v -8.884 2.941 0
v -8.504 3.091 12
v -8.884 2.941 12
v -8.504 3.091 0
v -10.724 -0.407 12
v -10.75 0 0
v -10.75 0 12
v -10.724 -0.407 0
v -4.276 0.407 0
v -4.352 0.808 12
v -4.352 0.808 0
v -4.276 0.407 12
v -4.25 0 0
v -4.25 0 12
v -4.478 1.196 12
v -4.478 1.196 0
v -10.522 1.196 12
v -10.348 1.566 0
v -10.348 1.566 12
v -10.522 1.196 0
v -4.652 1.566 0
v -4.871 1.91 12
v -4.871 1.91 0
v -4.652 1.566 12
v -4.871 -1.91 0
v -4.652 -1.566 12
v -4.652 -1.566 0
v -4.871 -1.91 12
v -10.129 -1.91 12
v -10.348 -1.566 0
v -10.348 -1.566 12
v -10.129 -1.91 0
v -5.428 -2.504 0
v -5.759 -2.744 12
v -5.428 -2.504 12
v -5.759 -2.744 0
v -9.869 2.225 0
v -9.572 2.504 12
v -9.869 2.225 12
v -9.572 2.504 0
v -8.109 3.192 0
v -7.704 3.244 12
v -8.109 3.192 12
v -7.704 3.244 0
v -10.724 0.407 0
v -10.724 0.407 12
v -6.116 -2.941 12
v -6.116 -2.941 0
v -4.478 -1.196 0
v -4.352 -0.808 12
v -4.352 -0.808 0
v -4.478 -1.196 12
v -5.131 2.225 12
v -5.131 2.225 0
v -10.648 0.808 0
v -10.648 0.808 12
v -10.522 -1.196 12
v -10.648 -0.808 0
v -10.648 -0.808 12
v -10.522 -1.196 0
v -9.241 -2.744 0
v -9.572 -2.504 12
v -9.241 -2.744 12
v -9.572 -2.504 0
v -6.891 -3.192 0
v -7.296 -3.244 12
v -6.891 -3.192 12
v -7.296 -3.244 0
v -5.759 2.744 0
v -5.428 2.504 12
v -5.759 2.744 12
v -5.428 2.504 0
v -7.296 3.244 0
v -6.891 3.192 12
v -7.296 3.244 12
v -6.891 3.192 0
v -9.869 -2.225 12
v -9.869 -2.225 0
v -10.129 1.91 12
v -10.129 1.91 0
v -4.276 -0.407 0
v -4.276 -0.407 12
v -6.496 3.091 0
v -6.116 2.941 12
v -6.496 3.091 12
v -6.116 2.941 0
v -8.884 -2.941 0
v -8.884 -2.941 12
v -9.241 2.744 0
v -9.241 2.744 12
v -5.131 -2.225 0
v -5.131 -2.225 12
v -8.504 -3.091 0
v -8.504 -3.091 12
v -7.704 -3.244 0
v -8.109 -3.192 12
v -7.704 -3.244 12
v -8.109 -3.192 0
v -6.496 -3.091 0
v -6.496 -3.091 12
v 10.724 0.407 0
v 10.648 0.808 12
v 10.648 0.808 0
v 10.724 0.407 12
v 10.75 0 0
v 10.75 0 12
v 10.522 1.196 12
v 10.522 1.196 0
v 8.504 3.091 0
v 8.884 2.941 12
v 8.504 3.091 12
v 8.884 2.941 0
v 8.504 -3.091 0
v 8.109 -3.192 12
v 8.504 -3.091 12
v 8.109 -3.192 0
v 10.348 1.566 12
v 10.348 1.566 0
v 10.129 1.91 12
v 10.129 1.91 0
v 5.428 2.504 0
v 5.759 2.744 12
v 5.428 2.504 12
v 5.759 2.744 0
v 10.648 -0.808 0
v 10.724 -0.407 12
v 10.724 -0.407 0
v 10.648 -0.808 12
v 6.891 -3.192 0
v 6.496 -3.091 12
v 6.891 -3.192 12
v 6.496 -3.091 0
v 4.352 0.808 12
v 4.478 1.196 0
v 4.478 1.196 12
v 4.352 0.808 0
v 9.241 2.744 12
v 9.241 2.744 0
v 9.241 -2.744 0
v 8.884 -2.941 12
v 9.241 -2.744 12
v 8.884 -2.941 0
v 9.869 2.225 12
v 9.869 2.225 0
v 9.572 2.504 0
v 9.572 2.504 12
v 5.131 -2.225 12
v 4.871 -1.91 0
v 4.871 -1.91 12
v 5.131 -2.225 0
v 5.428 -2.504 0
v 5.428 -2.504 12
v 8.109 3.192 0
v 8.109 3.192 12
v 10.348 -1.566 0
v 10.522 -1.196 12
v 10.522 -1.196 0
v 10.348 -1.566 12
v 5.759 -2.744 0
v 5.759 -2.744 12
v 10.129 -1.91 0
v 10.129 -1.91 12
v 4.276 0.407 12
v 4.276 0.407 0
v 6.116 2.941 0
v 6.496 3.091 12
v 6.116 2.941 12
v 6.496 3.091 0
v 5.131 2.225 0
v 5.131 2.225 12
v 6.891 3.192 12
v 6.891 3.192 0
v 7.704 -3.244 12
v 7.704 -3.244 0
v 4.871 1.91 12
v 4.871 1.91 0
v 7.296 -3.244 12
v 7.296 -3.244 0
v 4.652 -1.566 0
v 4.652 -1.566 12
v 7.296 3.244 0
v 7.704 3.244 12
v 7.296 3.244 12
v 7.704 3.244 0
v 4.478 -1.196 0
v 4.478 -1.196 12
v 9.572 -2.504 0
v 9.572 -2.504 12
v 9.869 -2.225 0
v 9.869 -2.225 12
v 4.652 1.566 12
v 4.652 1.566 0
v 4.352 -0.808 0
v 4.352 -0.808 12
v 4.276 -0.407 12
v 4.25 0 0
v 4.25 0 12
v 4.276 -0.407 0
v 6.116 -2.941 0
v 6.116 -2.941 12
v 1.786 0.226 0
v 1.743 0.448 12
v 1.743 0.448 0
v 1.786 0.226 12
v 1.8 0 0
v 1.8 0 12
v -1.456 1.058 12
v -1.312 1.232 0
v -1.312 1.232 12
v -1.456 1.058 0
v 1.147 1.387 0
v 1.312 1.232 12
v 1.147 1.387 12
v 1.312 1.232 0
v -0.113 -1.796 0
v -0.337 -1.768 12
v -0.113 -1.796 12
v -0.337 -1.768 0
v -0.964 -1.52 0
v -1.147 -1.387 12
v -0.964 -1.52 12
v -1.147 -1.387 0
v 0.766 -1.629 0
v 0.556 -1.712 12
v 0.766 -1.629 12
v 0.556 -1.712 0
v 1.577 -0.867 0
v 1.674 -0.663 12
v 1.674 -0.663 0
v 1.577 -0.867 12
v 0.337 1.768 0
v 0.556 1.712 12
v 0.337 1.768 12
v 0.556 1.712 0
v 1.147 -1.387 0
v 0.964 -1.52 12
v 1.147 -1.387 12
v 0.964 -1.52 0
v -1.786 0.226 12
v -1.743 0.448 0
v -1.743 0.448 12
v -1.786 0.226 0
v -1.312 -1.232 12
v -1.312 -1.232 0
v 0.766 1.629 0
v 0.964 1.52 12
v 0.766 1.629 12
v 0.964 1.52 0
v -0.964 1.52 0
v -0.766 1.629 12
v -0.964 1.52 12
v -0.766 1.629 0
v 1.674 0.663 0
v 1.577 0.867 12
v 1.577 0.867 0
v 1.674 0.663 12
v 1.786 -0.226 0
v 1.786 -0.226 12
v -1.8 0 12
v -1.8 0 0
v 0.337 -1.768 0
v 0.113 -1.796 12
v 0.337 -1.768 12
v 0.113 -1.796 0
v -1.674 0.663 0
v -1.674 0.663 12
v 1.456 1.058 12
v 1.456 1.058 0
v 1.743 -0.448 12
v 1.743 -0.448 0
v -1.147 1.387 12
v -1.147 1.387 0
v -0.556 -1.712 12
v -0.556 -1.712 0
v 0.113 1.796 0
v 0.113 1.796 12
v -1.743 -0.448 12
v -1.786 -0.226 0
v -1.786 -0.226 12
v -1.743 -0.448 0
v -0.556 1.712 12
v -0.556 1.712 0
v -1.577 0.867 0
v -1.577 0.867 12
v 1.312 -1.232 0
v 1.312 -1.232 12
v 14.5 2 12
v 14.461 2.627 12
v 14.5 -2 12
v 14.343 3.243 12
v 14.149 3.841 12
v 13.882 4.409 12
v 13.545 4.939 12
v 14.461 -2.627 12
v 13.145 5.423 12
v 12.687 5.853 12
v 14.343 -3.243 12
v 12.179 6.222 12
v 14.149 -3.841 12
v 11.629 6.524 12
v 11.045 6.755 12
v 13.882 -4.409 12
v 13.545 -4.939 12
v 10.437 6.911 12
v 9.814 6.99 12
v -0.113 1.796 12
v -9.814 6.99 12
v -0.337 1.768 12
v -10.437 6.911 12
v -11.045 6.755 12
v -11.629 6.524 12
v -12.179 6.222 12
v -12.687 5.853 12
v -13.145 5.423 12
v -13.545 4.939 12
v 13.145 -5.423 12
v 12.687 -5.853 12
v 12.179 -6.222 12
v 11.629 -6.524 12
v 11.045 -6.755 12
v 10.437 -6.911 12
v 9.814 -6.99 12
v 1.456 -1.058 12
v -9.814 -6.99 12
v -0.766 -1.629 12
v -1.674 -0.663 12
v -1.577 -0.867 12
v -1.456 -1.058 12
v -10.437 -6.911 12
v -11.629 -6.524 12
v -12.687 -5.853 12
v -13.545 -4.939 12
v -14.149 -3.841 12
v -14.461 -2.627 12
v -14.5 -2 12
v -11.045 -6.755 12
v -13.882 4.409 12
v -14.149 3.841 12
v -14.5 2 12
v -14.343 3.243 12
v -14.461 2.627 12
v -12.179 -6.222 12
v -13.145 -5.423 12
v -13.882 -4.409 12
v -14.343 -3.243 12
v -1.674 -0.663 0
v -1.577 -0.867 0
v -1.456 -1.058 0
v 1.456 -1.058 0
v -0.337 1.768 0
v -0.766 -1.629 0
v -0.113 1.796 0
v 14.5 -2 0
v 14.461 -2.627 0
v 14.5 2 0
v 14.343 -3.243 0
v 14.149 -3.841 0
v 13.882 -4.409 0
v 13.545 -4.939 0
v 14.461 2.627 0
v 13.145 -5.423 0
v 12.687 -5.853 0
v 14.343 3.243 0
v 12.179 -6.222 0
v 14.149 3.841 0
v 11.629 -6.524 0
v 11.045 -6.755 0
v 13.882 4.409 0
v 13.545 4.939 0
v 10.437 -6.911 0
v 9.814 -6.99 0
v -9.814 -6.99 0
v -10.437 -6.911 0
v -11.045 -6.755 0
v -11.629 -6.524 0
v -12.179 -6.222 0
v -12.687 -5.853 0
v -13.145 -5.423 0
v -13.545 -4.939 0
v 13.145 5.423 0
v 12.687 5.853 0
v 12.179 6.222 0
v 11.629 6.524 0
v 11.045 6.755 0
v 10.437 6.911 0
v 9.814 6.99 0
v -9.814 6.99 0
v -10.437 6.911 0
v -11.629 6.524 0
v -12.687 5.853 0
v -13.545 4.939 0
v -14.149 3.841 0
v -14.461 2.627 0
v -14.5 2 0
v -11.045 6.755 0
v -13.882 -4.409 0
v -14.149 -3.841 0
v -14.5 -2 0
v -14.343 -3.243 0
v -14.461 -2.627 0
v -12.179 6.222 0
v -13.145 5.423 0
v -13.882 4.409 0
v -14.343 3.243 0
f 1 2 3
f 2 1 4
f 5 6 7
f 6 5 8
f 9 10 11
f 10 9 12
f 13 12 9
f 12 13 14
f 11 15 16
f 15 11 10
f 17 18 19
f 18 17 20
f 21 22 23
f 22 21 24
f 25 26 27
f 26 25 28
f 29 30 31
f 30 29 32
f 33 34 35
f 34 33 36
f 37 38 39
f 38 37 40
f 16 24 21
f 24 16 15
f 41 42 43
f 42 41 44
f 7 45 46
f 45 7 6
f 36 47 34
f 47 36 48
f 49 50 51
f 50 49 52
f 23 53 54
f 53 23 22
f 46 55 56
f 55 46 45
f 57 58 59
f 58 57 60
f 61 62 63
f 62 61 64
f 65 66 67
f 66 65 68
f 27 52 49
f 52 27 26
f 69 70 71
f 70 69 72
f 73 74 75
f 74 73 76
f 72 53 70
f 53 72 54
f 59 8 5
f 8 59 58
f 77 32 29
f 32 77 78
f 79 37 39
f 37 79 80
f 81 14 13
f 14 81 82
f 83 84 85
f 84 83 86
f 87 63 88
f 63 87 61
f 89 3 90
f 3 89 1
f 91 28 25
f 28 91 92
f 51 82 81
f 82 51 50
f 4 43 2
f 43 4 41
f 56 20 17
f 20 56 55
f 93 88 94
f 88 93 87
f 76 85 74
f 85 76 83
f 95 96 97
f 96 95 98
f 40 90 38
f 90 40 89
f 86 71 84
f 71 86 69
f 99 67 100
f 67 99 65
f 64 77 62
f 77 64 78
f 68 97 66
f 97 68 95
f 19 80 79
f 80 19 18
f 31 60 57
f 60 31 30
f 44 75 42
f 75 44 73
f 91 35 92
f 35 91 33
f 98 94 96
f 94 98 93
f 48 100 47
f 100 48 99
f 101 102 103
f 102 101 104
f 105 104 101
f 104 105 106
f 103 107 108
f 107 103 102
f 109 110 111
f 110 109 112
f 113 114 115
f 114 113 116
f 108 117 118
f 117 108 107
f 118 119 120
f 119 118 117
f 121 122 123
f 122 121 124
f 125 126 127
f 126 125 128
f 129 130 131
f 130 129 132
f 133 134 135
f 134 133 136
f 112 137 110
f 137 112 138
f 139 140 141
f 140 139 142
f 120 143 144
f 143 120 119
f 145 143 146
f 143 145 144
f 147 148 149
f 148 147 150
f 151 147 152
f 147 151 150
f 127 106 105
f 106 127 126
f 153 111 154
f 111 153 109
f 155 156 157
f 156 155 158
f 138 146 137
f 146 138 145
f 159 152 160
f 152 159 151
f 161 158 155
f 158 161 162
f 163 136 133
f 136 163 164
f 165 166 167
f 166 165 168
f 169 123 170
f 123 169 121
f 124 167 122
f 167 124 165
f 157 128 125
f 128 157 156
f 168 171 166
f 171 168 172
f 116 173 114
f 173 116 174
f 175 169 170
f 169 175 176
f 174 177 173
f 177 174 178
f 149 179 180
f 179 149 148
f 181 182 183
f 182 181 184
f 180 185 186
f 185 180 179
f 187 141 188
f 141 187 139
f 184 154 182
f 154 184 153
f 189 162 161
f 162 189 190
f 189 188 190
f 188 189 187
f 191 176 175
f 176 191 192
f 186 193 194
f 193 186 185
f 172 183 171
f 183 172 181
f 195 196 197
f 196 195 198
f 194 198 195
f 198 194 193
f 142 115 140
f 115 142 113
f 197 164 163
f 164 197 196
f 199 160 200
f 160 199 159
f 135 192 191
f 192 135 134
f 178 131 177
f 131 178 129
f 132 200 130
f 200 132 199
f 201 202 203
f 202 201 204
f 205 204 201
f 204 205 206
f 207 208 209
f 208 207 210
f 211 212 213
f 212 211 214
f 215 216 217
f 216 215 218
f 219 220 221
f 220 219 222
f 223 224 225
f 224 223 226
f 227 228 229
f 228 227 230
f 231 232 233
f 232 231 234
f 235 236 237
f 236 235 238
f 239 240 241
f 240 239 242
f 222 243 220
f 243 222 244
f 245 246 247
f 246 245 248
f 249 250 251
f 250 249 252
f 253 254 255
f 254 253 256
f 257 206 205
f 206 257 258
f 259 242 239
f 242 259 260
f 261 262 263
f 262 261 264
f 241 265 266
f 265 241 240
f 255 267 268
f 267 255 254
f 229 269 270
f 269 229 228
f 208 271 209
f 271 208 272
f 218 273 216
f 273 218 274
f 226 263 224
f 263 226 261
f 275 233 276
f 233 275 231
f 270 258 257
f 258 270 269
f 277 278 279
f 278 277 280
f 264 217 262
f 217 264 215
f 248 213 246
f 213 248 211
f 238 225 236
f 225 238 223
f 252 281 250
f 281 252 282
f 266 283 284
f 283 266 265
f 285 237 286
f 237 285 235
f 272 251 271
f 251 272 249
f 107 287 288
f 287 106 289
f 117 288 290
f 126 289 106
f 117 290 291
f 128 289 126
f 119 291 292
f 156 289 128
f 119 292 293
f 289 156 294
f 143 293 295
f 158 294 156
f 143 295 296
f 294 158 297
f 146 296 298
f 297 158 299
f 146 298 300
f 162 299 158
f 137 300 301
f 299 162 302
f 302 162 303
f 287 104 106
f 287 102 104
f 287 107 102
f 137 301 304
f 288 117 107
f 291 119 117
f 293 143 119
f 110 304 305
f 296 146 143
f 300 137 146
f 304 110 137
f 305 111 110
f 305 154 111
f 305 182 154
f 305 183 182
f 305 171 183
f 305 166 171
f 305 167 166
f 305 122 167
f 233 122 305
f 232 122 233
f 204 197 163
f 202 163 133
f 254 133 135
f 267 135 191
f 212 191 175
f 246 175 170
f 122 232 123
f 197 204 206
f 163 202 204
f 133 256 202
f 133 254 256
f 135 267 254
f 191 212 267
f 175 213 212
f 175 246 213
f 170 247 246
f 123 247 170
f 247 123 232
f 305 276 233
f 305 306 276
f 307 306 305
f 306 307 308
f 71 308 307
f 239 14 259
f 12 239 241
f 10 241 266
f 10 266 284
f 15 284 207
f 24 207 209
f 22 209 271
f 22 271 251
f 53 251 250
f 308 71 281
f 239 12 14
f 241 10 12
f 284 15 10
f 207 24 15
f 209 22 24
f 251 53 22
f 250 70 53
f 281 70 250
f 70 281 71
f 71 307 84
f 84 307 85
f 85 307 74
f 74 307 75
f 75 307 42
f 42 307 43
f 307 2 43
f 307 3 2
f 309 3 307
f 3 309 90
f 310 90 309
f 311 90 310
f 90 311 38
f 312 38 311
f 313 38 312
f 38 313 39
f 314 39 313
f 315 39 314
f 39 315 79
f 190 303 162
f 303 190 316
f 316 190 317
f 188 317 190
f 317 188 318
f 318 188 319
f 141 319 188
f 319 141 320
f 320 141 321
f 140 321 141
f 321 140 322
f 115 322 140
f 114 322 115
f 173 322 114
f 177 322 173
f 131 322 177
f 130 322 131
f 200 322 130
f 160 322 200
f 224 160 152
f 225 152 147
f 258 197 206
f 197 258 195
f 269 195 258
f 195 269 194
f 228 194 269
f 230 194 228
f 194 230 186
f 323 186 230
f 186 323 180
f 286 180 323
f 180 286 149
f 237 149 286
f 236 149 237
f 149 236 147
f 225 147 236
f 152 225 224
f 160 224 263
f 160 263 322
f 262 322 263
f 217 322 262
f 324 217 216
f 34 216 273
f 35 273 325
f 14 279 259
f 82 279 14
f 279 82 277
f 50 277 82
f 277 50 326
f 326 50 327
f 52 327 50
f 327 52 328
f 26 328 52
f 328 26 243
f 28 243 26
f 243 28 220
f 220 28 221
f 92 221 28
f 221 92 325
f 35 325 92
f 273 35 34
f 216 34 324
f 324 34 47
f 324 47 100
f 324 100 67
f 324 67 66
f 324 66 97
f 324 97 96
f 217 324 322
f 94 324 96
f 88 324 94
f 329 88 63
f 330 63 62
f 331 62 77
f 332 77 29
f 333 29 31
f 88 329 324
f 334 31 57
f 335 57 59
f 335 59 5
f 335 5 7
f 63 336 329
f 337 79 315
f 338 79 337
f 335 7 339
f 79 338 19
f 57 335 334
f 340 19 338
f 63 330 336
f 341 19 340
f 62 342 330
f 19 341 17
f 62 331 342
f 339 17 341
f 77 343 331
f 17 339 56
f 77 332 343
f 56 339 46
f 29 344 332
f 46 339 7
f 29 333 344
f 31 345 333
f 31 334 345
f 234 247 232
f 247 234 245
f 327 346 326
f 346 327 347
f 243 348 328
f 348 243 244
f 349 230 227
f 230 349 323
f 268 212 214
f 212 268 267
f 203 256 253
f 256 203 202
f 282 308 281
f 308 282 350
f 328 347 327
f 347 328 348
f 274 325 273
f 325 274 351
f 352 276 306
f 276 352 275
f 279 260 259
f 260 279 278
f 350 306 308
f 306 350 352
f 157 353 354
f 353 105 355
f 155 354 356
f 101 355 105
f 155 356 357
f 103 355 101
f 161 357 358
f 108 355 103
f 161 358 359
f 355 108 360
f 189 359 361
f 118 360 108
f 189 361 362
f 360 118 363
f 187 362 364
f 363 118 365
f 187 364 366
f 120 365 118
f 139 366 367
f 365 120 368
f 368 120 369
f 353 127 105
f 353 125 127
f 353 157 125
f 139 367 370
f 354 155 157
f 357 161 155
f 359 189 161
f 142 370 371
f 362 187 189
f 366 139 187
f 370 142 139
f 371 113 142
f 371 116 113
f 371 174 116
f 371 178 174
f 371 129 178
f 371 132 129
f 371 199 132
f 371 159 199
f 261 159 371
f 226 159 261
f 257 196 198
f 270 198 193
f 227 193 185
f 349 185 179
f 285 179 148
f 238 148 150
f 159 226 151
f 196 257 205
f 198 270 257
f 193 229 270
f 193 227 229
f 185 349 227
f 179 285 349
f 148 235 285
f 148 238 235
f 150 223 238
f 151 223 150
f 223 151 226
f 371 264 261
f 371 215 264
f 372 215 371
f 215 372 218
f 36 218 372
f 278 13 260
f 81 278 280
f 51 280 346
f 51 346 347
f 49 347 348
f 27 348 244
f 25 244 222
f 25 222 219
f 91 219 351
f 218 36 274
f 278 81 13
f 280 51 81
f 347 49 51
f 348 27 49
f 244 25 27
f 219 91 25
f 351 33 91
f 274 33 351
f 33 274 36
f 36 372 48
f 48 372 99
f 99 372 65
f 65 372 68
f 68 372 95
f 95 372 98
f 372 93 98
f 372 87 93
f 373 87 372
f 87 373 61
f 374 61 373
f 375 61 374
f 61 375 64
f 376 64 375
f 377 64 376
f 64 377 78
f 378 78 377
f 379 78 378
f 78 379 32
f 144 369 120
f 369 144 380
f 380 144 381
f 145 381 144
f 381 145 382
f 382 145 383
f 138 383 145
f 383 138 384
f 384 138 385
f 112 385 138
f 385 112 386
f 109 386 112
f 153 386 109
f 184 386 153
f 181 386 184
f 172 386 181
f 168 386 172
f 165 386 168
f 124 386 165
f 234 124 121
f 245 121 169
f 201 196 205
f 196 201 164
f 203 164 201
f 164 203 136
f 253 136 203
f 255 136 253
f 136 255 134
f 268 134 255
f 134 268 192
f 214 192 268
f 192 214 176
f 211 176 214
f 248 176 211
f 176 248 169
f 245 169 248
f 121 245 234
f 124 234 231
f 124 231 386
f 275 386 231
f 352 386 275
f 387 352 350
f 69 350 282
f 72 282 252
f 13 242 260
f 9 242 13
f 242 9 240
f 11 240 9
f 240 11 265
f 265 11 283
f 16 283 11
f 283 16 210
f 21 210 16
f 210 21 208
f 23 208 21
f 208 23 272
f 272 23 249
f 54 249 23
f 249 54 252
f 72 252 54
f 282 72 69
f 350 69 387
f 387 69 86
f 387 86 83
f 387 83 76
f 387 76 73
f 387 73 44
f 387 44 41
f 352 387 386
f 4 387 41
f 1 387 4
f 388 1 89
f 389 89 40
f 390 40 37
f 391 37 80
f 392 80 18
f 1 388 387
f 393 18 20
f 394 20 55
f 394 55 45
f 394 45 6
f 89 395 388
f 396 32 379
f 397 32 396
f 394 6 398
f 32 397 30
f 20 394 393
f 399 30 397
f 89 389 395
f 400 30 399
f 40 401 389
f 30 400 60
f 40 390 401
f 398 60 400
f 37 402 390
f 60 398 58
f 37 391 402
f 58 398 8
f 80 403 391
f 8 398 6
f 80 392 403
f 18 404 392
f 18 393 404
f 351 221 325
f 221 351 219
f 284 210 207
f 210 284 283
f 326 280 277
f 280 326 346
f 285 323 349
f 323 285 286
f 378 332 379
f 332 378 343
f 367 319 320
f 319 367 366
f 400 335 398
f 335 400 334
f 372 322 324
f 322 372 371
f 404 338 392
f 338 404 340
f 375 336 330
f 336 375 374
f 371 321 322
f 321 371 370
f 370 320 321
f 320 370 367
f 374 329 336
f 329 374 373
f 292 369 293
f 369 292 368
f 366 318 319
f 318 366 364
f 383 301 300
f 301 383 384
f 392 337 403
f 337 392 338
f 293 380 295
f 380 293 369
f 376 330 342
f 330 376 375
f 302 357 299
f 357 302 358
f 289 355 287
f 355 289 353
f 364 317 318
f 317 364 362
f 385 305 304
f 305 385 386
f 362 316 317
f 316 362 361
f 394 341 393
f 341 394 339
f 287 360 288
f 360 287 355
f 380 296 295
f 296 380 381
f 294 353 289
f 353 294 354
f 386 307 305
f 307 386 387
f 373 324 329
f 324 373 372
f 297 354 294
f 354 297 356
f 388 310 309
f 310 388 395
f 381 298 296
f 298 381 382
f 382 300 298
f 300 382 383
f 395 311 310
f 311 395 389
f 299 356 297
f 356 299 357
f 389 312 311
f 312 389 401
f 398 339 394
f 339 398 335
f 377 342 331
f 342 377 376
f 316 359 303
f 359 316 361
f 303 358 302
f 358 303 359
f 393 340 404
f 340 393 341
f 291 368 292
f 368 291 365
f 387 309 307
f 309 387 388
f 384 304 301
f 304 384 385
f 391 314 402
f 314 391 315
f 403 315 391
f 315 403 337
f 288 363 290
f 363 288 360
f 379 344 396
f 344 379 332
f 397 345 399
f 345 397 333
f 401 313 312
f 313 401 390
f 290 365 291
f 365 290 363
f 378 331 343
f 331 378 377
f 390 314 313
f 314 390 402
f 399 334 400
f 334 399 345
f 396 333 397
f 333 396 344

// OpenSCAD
$fn = 50;


difference() {
	union() {
		hull() {
			translate(v = [-9.5000000000, 2.0000000000, 0]) {
				cylinder(h = 12, r = 5);
			}
			translate(v = [9.5000000000, 2.0000000000, 0]) {
				cylinder(h = 12, r = 5);
			}
			translate(v = [-9.5000000000, -2.0000000000, 0]) {
				cylinder(h = 12, r = 5);
			}
			translate(v = [9.5000000000, -2.0000000000, 0]) {
				cylinder(h = 12, r = 5);
			}
		}
	}
	union() {
		translate(v = [-7.5000000000, 0.0000000000, -100.0000000000]) {
			cylinder(h = 200, r = 3.2500000000);
		}
		translate(v = [7.5000000000, 0.0000000000, -100.0000000000]) {
			cylinder(h = 200, r = 3.2500000000);
		}
		translate(v = [-7.5000000000, 0.0000000000, 0]) {
			cylinder(h = 12, r = 1.8000000000);
		}
		cylinder(h = 12, r = 1.8000000000);
		translate(v = [7.5000000000, 0.0000000000, 0]) {
			cylinder(h = 12, r = 1.8000000000);
		}
		translate(v = [-7.5000000000, 0.0000000000, 0]) {
			cylinder(h = 12, r = 1.8000000000);
		}
		cylinder(h = 12, r = 1.8000000000);
		translate(v = [7.5000000000, 0.0000000000, 0]) {
			cylinder(h = 12, r = 1.8000000000);
		}
		translate(v = [-7.5000000000, 0.0000000000, 0]) {
			cylinder(h = 12, r = 1.8000000000);
		}
		cylinder(h = 12, r = 1.8000000000);
		translate(v = [7.5000000000, 0.0000000000, 0]) {
			cylinder(h = 12, r = 1.8000000000);
		}
	}
}
